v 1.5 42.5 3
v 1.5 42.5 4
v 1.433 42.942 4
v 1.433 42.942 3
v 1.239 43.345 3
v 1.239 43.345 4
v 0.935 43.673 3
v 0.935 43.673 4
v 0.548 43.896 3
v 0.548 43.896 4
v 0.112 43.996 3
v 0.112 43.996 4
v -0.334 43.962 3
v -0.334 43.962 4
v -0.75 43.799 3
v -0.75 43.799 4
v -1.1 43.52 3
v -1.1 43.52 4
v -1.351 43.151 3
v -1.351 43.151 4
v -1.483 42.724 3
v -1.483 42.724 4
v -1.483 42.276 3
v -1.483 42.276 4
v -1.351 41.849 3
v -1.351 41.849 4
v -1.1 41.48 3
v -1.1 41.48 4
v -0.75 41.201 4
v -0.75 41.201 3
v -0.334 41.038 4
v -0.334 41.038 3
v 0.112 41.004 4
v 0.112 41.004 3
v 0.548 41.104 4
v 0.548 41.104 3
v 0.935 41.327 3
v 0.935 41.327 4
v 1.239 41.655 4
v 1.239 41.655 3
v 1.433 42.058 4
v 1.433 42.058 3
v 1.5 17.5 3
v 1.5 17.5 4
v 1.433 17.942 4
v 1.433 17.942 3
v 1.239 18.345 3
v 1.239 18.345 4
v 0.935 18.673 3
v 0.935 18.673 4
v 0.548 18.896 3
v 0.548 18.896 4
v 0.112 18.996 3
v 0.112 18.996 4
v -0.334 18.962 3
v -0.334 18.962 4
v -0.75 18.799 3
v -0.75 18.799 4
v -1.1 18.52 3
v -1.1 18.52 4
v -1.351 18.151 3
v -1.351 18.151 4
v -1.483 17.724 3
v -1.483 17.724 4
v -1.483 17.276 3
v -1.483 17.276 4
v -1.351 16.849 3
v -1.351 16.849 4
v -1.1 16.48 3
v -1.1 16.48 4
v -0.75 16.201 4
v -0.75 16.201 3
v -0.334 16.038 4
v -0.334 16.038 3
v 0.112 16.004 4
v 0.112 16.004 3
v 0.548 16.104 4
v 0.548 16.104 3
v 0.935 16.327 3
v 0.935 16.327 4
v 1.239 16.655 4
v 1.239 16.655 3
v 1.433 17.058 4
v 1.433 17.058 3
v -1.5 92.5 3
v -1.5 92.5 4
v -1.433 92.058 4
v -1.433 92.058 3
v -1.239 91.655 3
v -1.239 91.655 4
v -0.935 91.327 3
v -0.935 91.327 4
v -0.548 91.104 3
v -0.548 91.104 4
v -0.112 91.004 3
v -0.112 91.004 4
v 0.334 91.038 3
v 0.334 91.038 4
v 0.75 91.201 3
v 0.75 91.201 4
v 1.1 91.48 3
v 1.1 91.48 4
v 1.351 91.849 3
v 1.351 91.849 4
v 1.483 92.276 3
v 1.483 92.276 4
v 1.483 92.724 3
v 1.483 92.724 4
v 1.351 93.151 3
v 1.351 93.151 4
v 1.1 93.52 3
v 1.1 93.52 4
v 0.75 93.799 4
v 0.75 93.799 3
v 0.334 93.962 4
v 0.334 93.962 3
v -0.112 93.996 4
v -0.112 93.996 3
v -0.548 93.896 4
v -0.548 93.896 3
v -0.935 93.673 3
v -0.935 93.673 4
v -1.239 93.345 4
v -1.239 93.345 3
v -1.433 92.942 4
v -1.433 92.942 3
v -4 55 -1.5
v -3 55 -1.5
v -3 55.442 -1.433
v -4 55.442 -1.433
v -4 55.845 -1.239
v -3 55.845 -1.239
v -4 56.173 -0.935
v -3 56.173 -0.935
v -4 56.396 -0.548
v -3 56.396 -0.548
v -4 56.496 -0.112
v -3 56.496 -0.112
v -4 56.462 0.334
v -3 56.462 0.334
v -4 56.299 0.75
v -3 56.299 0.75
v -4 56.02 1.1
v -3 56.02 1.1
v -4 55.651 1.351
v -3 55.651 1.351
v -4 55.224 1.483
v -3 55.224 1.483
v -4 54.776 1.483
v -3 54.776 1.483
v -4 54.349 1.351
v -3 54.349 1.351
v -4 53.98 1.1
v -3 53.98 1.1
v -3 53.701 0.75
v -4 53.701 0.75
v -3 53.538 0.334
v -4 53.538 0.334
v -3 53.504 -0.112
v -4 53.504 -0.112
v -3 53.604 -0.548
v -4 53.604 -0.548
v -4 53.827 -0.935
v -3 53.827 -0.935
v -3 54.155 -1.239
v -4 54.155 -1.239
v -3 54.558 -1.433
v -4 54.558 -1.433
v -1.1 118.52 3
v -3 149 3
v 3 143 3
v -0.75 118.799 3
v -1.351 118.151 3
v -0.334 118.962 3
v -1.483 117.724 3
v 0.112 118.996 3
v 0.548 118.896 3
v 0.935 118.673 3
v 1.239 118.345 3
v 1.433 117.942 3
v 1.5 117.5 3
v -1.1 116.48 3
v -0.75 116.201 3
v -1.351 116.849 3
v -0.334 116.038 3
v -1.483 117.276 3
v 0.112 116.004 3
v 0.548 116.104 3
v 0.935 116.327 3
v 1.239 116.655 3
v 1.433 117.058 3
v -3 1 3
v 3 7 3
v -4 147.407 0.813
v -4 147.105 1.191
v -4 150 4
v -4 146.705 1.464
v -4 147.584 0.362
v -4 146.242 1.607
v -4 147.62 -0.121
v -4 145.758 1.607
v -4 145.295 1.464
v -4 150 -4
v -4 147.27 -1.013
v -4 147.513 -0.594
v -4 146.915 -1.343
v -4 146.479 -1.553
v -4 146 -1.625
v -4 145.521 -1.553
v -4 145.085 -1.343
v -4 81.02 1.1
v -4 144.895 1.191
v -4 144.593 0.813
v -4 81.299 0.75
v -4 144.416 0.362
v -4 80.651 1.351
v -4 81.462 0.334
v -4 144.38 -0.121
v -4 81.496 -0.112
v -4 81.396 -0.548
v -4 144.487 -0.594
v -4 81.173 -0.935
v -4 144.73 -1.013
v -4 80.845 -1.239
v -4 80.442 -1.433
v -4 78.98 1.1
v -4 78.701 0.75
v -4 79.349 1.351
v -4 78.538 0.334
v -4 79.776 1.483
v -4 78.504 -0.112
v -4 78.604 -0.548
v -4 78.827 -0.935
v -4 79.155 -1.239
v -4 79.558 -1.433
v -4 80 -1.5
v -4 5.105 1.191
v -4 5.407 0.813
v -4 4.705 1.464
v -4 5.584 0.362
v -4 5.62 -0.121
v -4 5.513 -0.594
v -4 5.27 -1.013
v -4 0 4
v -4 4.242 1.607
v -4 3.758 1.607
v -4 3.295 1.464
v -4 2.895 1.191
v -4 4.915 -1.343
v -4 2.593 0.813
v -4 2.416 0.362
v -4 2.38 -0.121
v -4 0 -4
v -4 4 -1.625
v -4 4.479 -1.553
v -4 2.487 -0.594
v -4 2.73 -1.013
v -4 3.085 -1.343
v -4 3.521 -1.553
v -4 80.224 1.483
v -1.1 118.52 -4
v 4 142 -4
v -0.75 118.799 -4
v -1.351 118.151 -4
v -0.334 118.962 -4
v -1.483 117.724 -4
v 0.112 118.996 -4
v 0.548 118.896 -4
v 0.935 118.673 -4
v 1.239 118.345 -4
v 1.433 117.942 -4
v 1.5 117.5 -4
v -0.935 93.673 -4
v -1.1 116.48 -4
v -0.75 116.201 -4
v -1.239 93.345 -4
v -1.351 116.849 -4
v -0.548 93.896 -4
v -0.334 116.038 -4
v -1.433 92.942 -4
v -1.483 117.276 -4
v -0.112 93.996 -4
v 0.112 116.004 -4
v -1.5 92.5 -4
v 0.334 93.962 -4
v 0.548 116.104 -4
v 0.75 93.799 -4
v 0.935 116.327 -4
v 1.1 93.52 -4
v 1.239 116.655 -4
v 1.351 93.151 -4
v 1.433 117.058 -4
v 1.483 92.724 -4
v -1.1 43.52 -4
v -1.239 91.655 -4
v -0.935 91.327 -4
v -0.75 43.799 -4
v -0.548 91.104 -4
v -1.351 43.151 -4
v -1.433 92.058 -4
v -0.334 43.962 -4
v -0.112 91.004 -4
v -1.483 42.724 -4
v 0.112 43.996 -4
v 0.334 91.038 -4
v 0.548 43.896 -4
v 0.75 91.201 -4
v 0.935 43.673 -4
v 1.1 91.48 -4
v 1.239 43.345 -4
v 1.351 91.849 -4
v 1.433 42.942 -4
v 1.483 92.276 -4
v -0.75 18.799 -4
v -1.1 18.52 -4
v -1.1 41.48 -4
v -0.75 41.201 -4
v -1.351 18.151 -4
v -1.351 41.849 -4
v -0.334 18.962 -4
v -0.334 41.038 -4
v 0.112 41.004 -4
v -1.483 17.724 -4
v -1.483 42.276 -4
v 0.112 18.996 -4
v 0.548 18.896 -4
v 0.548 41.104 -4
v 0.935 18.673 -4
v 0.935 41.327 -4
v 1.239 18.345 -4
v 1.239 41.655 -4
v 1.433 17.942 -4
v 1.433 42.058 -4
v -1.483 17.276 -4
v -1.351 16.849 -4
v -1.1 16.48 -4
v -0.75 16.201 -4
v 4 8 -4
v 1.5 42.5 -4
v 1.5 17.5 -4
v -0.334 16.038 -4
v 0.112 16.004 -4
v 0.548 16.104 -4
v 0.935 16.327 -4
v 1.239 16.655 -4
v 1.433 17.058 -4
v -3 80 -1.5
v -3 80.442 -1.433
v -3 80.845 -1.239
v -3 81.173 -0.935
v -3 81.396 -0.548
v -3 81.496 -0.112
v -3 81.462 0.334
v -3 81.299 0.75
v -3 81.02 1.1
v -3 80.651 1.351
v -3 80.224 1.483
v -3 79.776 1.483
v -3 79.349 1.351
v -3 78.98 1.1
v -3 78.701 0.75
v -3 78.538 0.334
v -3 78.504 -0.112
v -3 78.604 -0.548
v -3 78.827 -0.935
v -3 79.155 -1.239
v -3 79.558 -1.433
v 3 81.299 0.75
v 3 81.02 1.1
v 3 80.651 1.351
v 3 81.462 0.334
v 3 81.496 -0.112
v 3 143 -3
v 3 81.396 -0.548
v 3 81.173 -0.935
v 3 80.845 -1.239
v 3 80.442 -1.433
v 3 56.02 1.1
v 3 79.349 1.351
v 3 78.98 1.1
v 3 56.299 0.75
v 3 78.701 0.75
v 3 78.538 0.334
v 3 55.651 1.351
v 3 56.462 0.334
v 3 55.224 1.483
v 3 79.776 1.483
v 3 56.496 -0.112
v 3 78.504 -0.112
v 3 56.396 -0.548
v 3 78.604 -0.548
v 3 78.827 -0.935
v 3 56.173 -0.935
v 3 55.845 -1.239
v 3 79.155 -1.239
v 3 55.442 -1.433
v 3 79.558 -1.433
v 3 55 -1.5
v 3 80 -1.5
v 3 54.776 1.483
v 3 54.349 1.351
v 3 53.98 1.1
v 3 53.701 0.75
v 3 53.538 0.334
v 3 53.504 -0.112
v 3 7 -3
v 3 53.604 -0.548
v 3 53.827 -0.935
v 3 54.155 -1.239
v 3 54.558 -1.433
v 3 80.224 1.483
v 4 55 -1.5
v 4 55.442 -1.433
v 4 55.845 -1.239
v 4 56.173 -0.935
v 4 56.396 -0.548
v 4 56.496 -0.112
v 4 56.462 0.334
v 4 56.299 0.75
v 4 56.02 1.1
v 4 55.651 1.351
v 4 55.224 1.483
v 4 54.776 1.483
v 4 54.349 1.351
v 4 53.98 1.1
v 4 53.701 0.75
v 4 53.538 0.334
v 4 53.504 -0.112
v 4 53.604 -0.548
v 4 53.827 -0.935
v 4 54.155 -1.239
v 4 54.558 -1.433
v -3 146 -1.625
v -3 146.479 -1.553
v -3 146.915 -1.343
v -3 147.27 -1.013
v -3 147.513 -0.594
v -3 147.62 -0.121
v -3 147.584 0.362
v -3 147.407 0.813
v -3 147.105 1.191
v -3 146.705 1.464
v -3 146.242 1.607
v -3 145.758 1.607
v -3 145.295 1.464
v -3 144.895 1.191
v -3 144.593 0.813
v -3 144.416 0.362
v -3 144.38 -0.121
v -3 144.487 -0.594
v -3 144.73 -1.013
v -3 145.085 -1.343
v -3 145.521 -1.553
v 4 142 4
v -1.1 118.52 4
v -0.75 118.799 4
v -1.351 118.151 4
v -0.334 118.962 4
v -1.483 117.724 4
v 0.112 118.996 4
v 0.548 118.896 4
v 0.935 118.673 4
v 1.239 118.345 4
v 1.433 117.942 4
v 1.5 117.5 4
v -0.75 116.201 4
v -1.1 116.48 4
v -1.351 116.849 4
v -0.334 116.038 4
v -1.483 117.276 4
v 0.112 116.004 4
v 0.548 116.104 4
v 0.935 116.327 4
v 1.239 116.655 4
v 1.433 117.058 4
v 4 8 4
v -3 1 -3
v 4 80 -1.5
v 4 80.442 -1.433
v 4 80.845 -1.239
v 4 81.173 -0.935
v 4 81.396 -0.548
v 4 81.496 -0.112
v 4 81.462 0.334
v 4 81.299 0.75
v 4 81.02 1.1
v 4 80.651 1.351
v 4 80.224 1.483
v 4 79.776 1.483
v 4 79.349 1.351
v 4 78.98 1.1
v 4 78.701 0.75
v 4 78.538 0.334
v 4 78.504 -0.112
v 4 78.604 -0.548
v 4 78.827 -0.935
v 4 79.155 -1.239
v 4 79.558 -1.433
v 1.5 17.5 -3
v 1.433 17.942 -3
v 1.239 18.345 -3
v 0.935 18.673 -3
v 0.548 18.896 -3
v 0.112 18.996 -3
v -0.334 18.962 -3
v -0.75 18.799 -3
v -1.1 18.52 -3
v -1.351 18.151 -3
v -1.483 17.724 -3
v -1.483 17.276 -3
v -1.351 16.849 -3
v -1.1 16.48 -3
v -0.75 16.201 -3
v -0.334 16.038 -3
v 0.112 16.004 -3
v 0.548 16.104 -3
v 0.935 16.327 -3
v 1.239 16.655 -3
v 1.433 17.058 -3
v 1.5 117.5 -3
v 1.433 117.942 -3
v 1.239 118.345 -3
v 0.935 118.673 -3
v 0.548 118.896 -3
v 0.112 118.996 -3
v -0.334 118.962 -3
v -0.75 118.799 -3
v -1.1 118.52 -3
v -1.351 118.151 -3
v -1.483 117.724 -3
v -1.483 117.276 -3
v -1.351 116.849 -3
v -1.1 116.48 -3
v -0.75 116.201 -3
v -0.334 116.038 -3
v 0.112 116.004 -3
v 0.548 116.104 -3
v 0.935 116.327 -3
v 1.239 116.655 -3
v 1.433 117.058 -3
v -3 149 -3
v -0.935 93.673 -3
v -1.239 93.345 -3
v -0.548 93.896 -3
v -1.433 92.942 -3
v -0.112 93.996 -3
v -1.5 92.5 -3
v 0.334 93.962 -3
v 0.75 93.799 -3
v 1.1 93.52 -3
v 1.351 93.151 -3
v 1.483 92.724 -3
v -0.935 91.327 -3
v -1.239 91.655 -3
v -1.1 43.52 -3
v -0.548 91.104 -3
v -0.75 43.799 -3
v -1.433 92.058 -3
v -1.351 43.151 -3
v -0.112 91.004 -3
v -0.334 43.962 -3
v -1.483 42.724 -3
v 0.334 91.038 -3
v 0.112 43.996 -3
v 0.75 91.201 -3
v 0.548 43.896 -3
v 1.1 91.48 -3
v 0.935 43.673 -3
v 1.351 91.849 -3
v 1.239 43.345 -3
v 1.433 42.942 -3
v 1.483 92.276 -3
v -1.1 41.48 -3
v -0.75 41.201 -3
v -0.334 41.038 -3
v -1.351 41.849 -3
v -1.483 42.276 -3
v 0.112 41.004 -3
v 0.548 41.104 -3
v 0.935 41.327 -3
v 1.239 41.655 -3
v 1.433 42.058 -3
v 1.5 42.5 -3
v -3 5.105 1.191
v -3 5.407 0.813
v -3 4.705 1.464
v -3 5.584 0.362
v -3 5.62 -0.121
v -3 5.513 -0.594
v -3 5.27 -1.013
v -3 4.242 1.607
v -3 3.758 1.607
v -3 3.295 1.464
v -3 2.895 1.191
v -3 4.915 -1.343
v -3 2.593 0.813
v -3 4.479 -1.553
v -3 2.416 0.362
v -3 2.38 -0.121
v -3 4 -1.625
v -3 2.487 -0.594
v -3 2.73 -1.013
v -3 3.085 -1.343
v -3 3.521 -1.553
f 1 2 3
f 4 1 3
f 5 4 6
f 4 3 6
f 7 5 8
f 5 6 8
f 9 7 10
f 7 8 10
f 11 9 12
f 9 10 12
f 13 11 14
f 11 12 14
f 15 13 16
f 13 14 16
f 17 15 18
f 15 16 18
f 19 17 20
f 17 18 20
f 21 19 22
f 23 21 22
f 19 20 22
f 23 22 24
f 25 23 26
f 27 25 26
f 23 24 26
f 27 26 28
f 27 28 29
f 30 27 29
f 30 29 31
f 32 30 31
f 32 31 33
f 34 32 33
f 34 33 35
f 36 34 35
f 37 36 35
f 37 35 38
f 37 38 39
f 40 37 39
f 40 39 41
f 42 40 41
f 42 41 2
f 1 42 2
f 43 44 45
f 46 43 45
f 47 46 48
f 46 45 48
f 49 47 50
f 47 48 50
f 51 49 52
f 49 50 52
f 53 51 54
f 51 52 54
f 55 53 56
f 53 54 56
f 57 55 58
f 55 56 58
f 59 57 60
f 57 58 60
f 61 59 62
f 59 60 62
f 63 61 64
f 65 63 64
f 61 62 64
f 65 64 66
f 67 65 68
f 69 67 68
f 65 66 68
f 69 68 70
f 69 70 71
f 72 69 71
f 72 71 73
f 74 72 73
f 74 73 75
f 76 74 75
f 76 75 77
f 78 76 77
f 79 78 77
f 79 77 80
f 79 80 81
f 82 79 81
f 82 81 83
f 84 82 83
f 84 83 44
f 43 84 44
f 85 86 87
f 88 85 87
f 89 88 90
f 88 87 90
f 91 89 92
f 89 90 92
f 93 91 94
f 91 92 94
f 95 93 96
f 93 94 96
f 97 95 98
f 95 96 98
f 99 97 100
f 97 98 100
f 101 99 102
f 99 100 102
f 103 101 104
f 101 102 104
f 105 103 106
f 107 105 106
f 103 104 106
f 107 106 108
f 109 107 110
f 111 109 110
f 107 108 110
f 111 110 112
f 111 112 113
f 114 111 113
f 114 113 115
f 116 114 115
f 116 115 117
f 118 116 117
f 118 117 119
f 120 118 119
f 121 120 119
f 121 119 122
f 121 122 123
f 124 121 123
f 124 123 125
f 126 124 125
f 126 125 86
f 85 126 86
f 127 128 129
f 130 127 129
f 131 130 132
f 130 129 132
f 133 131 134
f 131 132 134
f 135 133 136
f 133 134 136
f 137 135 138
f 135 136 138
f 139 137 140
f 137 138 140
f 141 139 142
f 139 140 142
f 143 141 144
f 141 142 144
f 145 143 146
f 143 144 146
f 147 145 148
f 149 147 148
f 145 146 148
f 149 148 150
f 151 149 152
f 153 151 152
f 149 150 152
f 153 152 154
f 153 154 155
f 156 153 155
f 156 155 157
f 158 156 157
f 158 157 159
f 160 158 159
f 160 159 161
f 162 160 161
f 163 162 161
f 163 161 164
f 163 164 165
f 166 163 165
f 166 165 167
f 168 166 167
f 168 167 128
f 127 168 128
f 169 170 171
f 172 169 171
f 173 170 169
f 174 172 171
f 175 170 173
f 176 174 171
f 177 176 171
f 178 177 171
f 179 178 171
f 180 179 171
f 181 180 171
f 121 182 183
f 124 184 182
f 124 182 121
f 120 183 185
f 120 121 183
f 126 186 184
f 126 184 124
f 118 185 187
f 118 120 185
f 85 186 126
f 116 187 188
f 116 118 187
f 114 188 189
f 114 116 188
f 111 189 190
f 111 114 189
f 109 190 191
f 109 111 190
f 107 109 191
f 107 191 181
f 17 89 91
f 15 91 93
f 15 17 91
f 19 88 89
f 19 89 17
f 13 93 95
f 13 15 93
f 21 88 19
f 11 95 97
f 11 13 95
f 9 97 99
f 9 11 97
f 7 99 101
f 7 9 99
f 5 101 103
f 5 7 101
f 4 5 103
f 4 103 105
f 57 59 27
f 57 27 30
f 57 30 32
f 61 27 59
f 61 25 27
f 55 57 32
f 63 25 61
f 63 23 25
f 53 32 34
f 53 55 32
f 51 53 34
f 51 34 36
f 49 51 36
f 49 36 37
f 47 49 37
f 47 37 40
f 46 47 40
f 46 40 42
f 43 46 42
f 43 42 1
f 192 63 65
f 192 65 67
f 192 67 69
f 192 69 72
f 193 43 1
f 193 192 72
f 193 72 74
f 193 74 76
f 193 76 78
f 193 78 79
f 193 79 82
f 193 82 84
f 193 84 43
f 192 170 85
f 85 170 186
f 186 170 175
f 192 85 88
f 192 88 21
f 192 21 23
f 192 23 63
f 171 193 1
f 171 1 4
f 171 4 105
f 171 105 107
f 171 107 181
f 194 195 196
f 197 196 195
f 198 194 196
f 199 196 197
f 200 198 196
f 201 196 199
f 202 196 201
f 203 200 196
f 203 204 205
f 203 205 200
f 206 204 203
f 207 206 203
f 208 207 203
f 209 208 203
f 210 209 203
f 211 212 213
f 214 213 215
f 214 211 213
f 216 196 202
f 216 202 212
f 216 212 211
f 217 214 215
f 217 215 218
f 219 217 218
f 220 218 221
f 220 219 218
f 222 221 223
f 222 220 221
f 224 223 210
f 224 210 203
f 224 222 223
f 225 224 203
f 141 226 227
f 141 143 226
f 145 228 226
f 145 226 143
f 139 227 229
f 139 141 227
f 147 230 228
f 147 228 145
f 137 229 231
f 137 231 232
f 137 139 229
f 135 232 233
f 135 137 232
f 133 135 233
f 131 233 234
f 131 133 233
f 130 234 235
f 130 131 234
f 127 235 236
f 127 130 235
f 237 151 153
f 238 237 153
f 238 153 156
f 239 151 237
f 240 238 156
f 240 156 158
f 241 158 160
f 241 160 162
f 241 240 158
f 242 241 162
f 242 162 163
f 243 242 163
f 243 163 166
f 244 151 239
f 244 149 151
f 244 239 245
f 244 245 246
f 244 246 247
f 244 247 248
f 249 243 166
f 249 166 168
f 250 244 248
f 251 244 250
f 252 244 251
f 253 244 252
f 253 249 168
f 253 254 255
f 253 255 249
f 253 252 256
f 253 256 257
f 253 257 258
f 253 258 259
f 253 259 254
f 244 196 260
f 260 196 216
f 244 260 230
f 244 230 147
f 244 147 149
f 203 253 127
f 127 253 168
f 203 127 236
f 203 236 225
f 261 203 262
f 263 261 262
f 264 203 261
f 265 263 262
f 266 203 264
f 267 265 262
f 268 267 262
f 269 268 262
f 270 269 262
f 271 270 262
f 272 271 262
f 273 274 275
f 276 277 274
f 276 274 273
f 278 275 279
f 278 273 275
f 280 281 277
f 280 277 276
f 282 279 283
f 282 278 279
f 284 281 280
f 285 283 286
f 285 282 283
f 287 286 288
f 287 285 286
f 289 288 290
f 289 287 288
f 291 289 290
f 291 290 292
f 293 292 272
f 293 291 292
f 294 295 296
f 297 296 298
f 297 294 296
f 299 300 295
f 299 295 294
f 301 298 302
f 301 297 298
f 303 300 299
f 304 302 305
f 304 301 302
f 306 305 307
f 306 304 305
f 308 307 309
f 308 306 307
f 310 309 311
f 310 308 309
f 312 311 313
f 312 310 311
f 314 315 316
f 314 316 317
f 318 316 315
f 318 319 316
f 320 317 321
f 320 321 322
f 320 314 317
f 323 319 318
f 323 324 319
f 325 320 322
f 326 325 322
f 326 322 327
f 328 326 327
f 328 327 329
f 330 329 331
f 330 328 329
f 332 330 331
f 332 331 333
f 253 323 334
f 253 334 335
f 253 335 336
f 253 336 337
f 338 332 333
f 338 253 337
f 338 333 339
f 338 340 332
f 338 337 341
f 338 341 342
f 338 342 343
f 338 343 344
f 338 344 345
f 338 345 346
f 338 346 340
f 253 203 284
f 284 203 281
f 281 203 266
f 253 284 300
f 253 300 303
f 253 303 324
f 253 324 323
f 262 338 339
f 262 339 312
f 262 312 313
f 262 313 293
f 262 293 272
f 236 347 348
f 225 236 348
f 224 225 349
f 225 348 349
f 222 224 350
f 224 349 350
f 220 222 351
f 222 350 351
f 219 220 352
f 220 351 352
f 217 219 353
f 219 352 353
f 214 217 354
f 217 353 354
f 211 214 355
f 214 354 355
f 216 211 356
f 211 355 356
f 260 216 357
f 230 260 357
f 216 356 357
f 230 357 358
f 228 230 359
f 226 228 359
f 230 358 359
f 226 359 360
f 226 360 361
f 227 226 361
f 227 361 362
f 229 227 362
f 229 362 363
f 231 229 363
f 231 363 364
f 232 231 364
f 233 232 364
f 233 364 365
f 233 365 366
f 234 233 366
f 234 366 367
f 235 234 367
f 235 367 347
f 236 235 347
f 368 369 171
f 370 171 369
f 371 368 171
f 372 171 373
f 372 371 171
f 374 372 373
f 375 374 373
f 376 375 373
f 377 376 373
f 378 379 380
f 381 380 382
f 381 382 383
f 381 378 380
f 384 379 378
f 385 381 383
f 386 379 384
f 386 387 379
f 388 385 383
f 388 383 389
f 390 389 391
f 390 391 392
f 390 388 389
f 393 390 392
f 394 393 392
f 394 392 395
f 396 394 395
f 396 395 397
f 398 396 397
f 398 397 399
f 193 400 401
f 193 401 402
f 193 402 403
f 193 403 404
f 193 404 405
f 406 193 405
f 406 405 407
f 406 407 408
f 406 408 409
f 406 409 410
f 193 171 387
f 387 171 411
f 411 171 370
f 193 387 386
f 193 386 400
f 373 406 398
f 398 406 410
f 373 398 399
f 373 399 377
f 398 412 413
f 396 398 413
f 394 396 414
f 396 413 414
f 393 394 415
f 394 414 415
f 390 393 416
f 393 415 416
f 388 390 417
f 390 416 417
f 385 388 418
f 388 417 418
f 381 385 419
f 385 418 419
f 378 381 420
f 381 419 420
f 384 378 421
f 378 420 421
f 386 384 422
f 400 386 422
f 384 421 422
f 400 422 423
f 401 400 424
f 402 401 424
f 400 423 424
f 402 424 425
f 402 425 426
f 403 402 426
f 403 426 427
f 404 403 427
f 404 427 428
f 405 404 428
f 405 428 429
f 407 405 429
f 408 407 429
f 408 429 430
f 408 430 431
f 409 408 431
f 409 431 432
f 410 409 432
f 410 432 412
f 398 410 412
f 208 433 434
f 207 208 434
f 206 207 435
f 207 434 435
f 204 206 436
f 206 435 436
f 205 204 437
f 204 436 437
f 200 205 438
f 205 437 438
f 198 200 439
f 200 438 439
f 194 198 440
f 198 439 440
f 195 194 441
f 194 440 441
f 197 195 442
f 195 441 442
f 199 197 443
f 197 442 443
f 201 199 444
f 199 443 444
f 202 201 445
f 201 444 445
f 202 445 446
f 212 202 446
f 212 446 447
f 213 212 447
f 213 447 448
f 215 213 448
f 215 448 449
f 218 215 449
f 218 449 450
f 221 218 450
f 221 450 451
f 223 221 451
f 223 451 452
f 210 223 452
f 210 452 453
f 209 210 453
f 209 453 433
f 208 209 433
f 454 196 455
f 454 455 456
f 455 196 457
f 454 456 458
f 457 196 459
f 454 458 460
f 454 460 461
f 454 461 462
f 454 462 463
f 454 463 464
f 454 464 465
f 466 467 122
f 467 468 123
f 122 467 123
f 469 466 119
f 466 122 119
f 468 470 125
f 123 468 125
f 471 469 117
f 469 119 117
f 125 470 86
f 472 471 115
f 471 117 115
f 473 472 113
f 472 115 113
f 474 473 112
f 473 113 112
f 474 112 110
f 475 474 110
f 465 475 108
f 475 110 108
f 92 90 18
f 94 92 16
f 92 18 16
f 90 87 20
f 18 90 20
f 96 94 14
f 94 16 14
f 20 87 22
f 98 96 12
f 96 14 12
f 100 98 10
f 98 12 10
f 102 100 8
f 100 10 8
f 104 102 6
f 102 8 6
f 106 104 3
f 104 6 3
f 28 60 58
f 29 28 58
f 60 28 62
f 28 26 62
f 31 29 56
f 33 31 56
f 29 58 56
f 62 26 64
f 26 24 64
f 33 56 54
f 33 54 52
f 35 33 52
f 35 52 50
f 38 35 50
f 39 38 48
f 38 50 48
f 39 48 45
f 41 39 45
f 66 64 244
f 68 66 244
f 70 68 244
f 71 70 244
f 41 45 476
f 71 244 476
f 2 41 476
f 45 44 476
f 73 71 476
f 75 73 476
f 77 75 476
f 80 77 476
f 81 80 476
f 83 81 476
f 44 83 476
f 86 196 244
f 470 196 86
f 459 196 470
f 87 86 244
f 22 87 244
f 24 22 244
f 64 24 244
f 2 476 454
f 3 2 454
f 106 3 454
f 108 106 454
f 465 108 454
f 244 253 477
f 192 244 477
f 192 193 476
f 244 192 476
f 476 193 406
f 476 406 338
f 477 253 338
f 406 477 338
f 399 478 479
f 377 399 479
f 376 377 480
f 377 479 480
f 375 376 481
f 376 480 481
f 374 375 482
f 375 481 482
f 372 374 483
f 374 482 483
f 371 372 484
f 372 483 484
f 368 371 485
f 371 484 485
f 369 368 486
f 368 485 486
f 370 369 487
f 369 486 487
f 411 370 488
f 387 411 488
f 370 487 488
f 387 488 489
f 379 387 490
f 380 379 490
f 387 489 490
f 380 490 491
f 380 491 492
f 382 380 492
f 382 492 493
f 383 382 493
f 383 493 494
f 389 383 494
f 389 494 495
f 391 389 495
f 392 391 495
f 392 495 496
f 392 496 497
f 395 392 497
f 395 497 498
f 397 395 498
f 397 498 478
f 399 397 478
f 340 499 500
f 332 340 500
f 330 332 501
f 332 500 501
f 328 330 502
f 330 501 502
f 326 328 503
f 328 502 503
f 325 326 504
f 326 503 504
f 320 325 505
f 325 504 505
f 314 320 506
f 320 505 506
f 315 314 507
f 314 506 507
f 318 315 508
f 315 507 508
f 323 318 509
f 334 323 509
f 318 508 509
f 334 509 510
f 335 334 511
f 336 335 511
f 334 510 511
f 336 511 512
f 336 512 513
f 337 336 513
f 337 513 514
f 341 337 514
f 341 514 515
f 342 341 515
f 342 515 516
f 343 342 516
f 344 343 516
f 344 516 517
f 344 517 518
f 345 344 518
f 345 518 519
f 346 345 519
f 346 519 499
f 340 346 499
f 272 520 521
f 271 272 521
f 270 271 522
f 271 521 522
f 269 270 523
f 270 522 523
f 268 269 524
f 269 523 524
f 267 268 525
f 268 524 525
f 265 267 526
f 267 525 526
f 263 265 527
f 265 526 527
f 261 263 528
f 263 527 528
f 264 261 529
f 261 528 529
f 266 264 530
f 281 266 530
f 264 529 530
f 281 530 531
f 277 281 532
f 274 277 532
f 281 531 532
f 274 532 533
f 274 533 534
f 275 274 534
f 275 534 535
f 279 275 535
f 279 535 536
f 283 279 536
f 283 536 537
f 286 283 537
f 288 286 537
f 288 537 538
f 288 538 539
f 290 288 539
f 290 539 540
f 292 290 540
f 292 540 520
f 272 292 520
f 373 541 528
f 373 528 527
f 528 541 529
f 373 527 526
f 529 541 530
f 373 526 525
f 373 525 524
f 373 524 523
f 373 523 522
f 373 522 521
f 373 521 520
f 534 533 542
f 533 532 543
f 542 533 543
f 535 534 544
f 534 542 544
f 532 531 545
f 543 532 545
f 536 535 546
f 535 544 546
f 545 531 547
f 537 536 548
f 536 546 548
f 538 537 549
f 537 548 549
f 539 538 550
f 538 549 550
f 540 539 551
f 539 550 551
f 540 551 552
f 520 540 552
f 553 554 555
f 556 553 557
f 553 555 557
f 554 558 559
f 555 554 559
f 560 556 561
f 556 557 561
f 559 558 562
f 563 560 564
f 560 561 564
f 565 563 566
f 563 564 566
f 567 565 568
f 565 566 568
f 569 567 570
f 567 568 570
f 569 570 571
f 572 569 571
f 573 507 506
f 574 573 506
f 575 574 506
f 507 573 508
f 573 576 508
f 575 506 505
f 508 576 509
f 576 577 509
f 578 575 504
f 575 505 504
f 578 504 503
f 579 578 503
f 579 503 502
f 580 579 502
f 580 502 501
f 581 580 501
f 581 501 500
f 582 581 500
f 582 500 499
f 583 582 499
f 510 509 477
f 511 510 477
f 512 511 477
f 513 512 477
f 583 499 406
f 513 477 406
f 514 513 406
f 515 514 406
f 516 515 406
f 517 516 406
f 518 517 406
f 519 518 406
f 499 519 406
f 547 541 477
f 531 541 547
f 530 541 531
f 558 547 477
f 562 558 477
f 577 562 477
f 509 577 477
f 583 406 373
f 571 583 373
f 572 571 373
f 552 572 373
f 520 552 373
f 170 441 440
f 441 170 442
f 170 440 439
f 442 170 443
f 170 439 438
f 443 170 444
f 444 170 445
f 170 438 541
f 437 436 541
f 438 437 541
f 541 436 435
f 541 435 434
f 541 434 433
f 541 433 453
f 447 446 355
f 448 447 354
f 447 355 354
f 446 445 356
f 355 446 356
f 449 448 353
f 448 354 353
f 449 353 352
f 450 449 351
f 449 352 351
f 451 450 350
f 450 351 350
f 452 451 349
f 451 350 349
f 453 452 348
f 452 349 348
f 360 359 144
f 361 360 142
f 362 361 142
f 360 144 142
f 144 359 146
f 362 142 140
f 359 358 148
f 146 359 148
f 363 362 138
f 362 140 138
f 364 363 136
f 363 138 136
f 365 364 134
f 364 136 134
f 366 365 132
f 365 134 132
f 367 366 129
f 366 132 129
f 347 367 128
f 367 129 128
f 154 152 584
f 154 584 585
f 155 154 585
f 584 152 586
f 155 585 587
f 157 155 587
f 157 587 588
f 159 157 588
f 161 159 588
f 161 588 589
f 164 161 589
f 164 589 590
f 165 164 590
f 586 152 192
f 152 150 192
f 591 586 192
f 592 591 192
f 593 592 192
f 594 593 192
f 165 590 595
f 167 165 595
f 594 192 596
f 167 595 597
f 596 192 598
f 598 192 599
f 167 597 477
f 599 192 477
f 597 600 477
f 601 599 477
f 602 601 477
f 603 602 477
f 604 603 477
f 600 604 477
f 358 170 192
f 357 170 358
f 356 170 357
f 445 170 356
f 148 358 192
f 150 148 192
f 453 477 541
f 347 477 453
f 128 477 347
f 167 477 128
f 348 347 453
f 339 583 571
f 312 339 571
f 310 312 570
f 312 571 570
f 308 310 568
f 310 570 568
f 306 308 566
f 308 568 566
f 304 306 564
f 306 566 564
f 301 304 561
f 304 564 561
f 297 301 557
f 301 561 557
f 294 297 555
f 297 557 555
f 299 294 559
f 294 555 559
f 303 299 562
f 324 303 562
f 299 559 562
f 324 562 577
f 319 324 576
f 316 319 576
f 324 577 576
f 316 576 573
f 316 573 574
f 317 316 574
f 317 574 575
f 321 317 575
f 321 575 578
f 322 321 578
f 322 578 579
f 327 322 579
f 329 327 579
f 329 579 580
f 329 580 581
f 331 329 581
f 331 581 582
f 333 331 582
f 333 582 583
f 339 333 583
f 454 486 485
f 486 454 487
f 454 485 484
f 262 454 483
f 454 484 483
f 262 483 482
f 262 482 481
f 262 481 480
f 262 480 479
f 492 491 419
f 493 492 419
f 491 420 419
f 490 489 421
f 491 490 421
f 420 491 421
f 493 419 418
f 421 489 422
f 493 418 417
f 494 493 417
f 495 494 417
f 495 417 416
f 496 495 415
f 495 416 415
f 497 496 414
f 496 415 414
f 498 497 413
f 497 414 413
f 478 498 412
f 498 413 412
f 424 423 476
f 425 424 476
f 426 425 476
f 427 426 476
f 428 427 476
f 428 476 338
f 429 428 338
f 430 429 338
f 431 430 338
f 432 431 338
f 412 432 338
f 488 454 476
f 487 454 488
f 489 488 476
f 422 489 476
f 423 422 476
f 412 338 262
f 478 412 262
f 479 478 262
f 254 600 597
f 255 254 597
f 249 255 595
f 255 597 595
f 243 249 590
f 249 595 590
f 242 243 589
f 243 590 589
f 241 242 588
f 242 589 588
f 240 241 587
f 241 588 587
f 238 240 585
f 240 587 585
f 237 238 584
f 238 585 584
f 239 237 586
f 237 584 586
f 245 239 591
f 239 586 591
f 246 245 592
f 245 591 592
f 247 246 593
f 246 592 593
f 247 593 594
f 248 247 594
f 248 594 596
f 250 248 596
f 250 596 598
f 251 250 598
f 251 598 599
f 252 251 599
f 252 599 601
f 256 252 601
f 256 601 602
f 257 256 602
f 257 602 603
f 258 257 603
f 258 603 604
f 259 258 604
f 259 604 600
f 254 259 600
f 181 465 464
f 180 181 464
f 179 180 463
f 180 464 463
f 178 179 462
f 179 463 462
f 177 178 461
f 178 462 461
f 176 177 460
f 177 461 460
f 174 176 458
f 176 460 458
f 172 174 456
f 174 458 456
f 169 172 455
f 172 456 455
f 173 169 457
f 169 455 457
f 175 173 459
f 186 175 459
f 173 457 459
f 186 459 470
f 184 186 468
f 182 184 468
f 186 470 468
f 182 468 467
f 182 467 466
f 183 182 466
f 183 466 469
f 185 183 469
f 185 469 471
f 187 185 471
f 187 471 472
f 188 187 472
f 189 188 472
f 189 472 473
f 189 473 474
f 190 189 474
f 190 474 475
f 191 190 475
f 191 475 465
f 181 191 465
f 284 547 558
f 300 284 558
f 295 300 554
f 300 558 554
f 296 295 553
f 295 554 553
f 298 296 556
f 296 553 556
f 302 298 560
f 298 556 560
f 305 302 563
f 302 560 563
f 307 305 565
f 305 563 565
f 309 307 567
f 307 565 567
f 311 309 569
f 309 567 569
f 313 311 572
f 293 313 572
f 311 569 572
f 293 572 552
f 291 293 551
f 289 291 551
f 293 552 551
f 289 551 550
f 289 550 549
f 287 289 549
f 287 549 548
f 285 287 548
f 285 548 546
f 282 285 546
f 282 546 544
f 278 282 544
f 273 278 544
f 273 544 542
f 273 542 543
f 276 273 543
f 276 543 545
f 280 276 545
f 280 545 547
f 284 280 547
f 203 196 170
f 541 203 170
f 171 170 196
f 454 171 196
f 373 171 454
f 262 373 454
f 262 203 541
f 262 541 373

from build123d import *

# Parameters (mm, degrees)
SKETCH_1_W          = 8
SKETCH_1_H          = 8
SKETCH_1_W_2        = 6
SKETCH_1_H_2        = 6
EXTRUDE_1_DEPTH     = 150
SKETCH_2_R          = 1.5
CUT_EXTRUDE_1_DEPTH = 10
CUT_EXTRUDE_2_DEPTH = 10
SKETCH_5_R          = 1.5
CUT_EXTRUDE_3_DEPTH = 10
SKETCH_6_R          = 1.625
CUT_EXTRUDE_4_DEPTH = 10


with BuildPart() as part:
    # 草图1 → 凸台-拉伸1 (new body)
    with BuildSketch(Plane(origin=(0, 0, 0), x_dir=(1, 0, 0), z_dir=(0, 1, 0))):
        Rectangle(SKETCH_1_W, SKETCH_1_H)
        Rectangle(SKETCH_1_W_2, SKETCH_1_H_2, mode=Mode.SUBTRACT)
    extrude(amount=EXTRUDE_1_DEPTH)

    # 草图2 → 切除-拉伸1 (cut)
    with BuildSketch(Plane(origin=(4, 0, 0), x_dir=(0, 0, -1), z_dir=(1, 0, 0))):
        with Locations((0, 80)):
            Circle(SKETCH_2_R)
        with Locations((0, 55)):
            Circle(SKETCH_2_R)
    extrude(amount=-CUT_EXTRUDE_1_DEPTH, mode=Mode.SUBTRACT)

    # 草图3 → 切除-拉伸2 (cut)
    with BuildSketch(Plane(origin=(0, 0, -4), x_dir=(-1, 0, 0), z_dir=(0, 0, -1))):
        Polygon((4, 150), (-4, 142), (-4, 150), align=None)
        Polygon((4, 0), (-4, 8), (-4, 0), align=None)
    extrude(amount=-CUT_EXTRUDE_2_DEPTH, mode=Mode.SUBTRACT)

    # 草图5 → 切除-拉伸3 (cut)
    with BuildSketch(Plane.XY.offset(4)):
        with Locations((0, 42.5)):
            Circle(SKETCH_5_R)
        with Locations(Location((0, 92.5, 0), (0, 0, 180))):
            Circle(SKETCH_5_R)
        with Locations((0, 117.5)):
            Circle(SKETCH_5_R)
        with Locations((0, 17.5)):
            Circle(SKETCH_5_R)
    extrude(amount=-CUT_EXTRUDE_3_DEPTH, mode=Mode.SUBTRACT)

    # 草图6 → 切除-拉伸4 (cut)
    with BuildSketch(Plane(origin=(-3, 0, 0), x_dir=(0, 0, -1), z_dir=(1, 0, 0))):
        with Locations((0, 146)):
            Circle(SKETCH_6_R)
        with Locations((0, 4)):
            Circle(SKETCH_6_R)
    extrude(amount=-CUT_EXTRUDE_4_DEPTH, mode=Mode.SUBTRACT)


solid = part.part
